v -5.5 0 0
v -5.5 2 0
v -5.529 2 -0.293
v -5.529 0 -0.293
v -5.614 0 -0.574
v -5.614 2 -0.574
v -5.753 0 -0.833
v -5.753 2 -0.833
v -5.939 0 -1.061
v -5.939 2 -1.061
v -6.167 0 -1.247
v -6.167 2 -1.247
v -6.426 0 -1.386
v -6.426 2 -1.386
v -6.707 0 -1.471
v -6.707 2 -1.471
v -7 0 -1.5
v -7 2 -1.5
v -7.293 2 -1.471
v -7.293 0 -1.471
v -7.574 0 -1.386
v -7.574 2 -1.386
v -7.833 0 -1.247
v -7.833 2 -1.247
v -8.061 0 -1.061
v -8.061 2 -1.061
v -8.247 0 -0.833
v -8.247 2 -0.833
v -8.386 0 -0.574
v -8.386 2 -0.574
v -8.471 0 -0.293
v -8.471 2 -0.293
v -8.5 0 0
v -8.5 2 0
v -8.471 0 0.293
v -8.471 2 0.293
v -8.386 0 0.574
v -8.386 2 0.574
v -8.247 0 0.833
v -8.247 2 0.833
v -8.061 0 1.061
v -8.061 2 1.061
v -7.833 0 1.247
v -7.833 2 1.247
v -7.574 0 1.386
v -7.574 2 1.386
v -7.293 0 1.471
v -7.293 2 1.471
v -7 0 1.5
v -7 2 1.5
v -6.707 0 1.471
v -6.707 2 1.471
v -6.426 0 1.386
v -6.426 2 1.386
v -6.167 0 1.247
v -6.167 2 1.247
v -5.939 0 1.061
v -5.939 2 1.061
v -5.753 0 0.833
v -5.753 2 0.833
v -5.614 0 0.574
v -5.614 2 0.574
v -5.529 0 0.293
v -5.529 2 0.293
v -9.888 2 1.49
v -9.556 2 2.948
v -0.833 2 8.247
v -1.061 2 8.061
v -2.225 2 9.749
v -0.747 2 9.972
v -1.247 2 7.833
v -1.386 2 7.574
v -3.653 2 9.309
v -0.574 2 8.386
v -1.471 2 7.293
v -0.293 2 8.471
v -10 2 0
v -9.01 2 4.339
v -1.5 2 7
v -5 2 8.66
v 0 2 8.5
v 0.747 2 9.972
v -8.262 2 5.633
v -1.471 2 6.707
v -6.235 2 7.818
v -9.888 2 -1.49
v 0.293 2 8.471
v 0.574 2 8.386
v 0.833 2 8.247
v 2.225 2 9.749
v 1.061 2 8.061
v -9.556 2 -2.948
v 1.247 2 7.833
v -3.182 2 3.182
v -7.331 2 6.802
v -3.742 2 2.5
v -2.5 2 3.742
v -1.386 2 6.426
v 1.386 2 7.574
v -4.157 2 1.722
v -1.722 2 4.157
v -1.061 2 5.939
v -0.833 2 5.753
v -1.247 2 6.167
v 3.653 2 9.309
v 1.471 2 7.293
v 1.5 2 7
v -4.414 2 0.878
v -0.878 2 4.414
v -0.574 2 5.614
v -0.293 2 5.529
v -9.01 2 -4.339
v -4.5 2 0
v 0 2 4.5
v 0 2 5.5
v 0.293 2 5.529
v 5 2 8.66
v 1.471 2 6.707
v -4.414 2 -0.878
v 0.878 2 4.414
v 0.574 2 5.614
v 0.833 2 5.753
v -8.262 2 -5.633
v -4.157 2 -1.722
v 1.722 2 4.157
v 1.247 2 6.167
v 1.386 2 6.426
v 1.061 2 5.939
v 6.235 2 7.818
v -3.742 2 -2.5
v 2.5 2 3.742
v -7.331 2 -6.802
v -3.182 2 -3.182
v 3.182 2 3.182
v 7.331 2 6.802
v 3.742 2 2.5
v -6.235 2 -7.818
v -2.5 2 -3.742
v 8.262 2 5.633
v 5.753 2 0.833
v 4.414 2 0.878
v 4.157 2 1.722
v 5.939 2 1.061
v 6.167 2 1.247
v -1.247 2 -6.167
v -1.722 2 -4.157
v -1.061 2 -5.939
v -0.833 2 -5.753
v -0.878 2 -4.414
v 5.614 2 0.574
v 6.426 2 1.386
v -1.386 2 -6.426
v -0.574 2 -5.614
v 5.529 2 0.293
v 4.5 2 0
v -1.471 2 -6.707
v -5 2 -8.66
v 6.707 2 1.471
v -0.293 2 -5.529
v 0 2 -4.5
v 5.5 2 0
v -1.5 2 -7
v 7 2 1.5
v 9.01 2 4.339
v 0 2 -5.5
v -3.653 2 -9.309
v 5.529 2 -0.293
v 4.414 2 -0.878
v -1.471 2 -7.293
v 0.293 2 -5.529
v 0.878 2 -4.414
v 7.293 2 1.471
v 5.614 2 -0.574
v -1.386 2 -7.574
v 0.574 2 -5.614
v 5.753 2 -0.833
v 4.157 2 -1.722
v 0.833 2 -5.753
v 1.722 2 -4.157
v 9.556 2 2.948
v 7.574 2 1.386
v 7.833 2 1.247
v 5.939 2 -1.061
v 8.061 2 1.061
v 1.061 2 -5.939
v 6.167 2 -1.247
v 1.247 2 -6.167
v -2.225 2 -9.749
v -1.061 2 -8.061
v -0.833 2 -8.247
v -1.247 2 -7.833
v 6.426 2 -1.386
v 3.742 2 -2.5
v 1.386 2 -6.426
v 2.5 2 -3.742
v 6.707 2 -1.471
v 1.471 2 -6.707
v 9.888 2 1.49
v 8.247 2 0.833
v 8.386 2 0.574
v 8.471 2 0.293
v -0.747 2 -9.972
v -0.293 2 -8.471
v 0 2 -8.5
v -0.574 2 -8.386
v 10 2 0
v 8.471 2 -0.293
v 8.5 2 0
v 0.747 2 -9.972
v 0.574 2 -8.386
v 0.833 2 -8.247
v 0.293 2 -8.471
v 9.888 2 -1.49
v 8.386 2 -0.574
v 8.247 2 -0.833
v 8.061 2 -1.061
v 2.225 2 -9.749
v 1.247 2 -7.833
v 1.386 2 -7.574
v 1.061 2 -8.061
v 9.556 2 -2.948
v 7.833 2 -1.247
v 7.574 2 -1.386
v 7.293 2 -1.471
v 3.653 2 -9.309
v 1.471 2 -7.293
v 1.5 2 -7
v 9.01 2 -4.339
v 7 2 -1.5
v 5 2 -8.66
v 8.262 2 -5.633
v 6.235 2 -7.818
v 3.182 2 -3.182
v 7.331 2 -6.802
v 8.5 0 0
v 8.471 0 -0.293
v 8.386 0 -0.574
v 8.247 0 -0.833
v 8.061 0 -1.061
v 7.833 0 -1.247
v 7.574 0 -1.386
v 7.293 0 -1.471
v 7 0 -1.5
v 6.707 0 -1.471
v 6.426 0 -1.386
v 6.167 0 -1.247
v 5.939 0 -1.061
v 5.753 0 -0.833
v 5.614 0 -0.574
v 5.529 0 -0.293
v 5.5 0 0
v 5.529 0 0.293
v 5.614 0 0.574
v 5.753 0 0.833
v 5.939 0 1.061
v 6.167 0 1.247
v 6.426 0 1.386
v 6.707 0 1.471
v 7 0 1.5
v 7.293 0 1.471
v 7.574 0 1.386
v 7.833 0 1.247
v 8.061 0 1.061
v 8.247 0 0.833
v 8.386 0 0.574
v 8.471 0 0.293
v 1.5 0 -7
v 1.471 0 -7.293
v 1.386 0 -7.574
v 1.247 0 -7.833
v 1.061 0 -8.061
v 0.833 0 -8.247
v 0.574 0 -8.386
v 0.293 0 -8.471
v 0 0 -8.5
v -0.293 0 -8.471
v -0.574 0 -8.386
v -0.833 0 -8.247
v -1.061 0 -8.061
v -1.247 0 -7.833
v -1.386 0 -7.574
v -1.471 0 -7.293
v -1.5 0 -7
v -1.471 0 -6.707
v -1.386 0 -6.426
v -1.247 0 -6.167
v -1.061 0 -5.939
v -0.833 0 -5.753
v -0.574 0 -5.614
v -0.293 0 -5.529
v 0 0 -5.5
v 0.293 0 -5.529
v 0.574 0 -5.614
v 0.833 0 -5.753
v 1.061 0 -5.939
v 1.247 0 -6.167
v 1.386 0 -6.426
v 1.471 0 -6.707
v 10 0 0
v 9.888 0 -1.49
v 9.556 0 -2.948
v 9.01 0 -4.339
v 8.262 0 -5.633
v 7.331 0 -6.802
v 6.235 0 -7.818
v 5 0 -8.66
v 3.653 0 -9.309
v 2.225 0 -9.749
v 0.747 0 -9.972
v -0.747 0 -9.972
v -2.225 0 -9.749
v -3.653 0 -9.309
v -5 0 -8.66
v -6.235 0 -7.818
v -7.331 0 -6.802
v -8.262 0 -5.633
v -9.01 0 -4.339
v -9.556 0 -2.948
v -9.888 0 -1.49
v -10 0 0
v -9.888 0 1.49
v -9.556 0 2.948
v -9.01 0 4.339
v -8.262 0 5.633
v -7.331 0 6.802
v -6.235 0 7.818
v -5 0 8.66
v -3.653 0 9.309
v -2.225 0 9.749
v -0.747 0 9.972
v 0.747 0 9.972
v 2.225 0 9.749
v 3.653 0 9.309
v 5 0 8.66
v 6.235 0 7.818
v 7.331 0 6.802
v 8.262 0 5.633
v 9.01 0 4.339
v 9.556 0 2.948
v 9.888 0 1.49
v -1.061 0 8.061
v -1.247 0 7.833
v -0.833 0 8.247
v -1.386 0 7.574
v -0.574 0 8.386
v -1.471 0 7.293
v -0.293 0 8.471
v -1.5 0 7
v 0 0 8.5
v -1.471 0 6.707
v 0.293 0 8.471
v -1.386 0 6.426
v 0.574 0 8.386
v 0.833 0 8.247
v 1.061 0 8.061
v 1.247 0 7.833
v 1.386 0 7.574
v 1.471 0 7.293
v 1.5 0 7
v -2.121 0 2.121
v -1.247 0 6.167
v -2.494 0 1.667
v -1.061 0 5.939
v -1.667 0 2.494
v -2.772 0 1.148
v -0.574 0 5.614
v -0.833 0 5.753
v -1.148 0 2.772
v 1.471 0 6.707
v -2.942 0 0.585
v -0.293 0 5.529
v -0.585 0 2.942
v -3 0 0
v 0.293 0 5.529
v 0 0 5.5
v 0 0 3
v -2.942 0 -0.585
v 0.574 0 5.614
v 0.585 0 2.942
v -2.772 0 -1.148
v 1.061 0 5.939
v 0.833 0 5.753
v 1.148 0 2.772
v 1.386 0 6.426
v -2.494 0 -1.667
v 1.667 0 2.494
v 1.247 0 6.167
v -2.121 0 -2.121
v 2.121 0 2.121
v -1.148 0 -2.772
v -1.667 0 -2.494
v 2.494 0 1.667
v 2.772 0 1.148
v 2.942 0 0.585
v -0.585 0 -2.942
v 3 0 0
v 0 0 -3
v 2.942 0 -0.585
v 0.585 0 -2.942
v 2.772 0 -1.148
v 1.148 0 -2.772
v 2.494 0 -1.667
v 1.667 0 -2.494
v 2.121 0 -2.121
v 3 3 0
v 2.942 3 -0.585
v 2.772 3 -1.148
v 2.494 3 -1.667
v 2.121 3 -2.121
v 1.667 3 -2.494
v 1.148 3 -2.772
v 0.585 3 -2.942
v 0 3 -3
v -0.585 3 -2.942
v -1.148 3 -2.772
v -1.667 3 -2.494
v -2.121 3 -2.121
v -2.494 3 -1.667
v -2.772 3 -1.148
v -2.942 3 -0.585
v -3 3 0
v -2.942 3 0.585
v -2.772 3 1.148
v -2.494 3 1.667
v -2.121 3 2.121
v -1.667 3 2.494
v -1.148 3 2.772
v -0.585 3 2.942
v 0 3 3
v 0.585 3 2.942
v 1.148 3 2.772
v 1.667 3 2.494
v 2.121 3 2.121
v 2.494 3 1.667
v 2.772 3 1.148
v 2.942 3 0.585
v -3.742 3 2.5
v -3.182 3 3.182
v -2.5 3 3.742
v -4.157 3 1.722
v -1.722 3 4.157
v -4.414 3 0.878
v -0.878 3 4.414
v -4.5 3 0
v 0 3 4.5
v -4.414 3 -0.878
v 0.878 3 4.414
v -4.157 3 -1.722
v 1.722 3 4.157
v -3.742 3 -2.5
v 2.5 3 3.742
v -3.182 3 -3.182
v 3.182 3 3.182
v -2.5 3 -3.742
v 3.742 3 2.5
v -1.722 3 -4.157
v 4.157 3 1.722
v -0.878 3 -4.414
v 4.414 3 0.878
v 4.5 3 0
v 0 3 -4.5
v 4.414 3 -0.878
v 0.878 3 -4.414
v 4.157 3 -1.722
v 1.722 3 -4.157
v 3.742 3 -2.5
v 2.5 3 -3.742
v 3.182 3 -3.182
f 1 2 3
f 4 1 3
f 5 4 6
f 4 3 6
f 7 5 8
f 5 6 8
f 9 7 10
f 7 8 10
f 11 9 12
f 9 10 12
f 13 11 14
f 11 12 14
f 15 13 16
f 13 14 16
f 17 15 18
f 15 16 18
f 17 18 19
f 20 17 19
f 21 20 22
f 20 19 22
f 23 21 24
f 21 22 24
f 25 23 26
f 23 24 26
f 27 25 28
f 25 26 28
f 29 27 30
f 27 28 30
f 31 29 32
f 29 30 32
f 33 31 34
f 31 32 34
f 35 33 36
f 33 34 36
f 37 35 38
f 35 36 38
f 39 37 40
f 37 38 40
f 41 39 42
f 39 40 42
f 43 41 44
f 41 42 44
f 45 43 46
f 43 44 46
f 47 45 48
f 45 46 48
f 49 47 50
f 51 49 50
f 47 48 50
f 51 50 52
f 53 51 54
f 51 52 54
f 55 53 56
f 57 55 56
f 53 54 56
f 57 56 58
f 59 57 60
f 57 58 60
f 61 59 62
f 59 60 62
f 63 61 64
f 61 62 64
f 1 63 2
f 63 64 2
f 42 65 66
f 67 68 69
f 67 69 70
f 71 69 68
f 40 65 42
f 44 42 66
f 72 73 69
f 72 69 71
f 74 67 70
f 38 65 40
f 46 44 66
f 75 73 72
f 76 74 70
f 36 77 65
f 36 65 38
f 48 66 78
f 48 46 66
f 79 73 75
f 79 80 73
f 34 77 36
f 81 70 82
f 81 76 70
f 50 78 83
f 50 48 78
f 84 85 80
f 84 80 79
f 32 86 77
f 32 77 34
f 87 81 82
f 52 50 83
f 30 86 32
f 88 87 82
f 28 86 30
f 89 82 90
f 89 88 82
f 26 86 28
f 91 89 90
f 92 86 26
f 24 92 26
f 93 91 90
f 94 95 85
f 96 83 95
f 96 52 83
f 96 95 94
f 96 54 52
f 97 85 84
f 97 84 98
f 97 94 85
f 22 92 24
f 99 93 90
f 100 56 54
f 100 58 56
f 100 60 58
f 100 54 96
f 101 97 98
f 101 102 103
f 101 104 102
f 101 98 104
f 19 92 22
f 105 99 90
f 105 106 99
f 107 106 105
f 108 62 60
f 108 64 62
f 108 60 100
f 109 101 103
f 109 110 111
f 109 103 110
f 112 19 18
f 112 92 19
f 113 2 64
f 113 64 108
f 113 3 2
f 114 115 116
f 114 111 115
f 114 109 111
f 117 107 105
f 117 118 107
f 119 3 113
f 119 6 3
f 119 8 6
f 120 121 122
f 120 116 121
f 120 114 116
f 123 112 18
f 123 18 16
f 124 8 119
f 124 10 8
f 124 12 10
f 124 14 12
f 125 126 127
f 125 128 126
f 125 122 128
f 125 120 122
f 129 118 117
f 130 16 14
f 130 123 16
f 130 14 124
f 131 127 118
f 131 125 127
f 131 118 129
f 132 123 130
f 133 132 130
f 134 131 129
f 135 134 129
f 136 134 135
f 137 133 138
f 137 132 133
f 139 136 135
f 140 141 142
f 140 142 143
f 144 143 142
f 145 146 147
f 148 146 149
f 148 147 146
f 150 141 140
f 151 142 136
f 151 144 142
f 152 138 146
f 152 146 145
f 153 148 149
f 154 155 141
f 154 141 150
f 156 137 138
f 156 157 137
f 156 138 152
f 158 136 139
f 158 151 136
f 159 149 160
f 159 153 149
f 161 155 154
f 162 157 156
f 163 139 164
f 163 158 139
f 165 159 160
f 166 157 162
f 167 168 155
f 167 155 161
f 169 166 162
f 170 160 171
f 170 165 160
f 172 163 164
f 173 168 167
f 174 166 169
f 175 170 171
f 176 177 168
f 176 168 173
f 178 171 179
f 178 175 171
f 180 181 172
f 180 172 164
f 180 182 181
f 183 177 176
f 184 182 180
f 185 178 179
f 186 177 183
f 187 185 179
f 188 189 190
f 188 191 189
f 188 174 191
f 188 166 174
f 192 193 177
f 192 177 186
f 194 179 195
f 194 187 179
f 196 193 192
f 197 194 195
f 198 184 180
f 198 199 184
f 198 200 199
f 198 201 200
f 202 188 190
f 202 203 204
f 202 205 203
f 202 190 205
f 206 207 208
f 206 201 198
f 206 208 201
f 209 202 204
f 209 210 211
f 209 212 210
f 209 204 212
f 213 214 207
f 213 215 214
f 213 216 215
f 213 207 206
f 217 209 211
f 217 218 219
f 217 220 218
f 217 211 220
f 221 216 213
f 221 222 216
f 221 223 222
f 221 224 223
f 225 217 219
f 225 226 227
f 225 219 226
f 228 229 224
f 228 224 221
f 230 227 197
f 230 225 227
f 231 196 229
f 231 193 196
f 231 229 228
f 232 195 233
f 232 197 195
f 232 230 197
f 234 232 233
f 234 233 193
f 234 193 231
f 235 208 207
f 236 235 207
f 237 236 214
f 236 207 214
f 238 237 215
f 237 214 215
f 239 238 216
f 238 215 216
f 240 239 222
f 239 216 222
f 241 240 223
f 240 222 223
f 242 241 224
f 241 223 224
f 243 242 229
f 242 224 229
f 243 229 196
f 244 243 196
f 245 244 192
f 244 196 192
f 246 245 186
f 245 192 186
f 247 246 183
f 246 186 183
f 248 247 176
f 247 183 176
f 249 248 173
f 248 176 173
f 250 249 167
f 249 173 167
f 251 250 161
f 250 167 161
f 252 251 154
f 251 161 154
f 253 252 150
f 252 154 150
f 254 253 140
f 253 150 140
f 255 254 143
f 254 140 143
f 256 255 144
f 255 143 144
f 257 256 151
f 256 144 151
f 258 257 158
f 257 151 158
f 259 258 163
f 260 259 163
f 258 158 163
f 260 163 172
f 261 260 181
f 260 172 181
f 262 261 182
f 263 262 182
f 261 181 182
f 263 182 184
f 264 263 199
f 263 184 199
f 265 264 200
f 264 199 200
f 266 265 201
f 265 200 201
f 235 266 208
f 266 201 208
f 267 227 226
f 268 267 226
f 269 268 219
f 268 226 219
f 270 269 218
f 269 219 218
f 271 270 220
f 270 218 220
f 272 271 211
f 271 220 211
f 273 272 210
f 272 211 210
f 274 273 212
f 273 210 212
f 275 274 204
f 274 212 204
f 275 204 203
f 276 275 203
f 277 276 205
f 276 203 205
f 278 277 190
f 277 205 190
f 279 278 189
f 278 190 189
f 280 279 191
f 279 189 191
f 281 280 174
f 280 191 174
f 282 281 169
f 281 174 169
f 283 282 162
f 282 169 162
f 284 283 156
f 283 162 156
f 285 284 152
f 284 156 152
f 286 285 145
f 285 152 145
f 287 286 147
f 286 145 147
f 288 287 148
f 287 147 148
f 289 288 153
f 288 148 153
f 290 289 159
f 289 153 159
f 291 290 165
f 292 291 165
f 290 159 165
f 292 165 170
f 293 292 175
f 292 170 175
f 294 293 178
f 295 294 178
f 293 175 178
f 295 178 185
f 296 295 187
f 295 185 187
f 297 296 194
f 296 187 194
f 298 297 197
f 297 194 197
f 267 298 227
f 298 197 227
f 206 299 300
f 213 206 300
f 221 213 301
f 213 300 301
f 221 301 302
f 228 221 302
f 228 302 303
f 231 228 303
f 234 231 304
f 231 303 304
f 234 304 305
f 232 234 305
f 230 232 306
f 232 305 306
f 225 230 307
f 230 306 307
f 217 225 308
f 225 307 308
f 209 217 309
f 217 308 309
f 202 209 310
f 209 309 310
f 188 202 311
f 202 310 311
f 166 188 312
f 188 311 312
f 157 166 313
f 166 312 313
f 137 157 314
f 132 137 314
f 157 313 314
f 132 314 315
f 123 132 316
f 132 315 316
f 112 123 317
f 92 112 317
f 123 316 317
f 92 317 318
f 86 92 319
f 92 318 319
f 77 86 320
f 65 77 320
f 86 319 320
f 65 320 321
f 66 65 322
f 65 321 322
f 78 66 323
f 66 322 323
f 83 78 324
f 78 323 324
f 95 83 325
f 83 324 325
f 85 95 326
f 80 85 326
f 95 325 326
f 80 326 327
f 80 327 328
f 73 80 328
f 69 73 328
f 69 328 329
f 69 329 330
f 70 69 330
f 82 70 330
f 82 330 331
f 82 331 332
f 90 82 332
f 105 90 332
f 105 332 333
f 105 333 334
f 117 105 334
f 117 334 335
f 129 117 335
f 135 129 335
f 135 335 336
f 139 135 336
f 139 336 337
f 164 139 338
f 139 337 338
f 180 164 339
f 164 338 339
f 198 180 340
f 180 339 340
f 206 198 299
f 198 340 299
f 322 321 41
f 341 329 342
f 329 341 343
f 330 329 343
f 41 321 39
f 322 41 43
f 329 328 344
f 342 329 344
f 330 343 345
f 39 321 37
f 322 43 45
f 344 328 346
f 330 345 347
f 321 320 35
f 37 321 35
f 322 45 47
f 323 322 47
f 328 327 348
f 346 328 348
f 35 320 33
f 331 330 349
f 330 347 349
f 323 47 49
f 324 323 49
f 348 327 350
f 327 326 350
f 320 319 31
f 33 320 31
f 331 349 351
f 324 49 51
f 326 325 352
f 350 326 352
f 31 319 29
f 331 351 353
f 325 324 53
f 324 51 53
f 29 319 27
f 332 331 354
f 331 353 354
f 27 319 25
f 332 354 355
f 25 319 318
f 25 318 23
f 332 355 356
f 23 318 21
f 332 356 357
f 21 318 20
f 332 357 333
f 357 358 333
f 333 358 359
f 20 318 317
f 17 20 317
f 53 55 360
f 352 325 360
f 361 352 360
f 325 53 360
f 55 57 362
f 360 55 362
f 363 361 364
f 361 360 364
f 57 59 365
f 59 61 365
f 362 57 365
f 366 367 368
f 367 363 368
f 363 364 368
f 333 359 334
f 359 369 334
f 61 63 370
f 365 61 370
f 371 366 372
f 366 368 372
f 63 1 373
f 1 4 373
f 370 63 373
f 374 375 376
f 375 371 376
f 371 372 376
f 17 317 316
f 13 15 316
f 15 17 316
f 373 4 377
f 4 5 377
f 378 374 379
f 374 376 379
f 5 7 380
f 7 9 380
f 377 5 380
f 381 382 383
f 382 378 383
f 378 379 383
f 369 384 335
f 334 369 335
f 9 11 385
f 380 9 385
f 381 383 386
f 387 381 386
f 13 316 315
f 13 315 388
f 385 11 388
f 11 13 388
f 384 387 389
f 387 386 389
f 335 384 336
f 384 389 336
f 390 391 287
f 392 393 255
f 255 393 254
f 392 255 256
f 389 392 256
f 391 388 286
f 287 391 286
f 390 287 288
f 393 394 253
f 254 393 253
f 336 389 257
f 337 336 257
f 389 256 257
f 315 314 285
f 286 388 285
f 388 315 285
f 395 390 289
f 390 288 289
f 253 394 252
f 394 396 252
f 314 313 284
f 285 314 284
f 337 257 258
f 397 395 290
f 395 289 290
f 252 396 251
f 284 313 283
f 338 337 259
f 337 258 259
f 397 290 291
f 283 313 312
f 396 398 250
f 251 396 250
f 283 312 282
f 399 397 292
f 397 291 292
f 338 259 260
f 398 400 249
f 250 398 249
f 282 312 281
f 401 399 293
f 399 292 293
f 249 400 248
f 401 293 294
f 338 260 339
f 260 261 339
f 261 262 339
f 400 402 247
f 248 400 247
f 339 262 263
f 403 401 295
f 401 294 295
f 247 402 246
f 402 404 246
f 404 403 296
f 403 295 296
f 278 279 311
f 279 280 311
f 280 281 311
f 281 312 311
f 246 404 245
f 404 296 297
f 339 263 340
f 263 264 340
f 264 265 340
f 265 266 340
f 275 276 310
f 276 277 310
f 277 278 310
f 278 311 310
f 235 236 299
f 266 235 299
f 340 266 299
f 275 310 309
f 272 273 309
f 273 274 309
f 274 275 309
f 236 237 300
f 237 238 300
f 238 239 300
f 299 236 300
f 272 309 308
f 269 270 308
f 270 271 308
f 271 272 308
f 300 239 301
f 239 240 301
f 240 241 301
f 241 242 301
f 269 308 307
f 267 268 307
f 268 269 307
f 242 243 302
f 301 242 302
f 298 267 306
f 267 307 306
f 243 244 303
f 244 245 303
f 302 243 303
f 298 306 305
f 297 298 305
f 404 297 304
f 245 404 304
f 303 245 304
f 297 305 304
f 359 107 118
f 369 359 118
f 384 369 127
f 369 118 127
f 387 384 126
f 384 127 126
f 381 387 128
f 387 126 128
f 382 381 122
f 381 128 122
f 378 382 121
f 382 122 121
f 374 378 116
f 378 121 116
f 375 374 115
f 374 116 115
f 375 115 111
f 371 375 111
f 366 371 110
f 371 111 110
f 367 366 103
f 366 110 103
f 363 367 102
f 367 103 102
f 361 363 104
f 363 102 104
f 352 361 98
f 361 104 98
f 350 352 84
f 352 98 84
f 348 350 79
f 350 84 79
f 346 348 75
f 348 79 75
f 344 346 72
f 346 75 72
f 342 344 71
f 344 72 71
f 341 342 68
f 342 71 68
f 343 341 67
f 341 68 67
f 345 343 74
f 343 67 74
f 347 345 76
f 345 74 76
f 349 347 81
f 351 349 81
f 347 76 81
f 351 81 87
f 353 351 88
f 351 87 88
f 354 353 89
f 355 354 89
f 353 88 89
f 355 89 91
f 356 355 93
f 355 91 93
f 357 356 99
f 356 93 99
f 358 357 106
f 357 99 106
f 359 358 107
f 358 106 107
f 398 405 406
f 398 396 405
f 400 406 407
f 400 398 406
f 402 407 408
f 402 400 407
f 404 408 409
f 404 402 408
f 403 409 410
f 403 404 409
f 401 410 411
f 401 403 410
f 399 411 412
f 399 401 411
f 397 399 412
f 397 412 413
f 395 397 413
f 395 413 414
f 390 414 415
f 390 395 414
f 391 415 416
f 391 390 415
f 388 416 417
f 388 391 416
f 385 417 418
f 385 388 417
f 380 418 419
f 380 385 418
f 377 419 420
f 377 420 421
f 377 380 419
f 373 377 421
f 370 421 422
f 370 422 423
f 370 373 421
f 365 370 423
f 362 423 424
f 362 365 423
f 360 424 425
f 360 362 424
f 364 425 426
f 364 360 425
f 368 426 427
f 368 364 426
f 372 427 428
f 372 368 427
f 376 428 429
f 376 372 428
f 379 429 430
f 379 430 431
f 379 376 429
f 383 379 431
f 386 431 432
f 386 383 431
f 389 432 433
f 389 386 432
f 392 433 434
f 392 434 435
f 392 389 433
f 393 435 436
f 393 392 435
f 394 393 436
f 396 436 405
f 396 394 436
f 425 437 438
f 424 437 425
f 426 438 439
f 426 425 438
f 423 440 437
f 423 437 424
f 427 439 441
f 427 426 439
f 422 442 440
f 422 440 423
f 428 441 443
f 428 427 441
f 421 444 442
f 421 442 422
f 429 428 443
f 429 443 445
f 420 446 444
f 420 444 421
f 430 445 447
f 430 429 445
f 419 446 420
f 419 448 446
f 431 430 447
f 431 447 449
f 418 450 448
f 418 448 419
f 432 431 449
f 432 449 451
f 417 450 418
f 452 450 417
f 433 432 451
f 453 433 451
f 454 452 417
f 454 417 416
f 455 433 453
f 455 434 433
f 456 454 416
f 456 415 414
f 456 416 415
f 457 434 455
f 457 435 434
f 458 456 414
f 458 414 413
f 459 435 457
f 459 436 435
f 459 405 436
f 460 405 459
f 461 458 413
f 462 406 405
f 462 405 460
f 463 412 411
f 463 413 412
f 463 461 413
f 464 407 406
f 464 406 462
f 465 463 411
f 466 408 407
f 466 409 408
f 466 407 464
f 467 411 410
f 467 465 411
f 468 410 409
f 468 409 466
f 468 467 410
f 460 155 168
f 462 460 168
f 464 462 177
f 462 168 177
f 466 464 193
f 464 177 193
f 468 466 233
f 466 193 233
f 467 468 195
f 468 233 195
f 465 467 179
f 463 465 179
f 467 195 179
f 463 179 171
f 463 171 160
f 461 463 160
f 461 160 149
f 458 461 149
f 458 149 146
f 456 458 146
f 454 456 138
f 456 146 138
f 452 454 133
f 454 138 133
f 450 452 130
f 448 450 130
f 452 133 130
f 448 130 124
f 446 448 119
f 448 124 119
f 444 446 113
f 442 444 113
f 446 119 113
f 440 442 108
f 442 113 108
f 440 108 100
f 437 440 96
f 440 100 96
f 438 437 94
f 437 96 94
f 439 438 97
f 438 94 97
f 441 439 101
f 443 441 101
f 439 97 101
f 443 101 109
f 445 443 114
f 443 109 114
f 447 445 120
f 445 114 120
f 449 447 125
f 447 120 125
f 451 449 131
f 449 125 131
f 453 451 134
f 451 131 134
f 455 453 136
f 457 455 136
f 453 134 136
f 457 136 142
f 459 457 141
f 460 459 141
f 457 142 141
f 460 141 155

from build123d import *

# Parameters (mm, degrees)
SKETCH_1_R          = 10
EXTRUDE_1_DEPTH     = 2
SKETCH_2_R          = 3
SKETCH_2_R_2        = 1.5
CUT_EXTRUDE_1_DEPTH = 2
SKETCH_3_R          = 4.5
SKETCH_3_R_2        = 3
EXTRUDE_2_DEPTH     = 1


with BuildPart() as part:
    # 草图1 → 凸台-拉伸1 (new body)
    with BuildSketch(Plane(origin=(0, 0, 0), x_dir=(1, 0, 0), z_dir=(0, 1, 0))):
        Circle(SKETCH_1_R)
    extrude(amount=EXTRUDE_1_DEPTH)

    # 草图2 → 切除-拉伸1 (cut)
    with BuildSketch(Plane(origin=(0, 2, 0), x_dir=(1, 0, 0), z_dir=(0, 1, 0))):
        Circle(SKETCH_2_R)
        with Locations((0, 7)):
            Circle(SKETCH_2_R_2)
        with Locations((7, 0)):
            Circle(SKETCH_2_R_2)
        with Locations((0, -7)):
            Circle(SKETCH_2_R_2)
        with Locations((-7, 0)):
            Circle(SKETCH_2_R_2)
    extrude(amount=-CUT_EXTRUDE_1_DEPTH, mode=Mode.SUBTRACT)

    # 草图3 → 凸台-拉伸2 (add)
    with BuildSketch(Plane(origin=(0, 2, 0), x_dir=(1, 0, 0), z_dir=(0, 1, 0))):
        Circle(SKETCH_3_R)
        Circle(SKETCH_3_R_2, mode=Mode.SUBTRACT)
    extrude(amount=EXTRUDE_2_DEPTH)


solid = part.part
